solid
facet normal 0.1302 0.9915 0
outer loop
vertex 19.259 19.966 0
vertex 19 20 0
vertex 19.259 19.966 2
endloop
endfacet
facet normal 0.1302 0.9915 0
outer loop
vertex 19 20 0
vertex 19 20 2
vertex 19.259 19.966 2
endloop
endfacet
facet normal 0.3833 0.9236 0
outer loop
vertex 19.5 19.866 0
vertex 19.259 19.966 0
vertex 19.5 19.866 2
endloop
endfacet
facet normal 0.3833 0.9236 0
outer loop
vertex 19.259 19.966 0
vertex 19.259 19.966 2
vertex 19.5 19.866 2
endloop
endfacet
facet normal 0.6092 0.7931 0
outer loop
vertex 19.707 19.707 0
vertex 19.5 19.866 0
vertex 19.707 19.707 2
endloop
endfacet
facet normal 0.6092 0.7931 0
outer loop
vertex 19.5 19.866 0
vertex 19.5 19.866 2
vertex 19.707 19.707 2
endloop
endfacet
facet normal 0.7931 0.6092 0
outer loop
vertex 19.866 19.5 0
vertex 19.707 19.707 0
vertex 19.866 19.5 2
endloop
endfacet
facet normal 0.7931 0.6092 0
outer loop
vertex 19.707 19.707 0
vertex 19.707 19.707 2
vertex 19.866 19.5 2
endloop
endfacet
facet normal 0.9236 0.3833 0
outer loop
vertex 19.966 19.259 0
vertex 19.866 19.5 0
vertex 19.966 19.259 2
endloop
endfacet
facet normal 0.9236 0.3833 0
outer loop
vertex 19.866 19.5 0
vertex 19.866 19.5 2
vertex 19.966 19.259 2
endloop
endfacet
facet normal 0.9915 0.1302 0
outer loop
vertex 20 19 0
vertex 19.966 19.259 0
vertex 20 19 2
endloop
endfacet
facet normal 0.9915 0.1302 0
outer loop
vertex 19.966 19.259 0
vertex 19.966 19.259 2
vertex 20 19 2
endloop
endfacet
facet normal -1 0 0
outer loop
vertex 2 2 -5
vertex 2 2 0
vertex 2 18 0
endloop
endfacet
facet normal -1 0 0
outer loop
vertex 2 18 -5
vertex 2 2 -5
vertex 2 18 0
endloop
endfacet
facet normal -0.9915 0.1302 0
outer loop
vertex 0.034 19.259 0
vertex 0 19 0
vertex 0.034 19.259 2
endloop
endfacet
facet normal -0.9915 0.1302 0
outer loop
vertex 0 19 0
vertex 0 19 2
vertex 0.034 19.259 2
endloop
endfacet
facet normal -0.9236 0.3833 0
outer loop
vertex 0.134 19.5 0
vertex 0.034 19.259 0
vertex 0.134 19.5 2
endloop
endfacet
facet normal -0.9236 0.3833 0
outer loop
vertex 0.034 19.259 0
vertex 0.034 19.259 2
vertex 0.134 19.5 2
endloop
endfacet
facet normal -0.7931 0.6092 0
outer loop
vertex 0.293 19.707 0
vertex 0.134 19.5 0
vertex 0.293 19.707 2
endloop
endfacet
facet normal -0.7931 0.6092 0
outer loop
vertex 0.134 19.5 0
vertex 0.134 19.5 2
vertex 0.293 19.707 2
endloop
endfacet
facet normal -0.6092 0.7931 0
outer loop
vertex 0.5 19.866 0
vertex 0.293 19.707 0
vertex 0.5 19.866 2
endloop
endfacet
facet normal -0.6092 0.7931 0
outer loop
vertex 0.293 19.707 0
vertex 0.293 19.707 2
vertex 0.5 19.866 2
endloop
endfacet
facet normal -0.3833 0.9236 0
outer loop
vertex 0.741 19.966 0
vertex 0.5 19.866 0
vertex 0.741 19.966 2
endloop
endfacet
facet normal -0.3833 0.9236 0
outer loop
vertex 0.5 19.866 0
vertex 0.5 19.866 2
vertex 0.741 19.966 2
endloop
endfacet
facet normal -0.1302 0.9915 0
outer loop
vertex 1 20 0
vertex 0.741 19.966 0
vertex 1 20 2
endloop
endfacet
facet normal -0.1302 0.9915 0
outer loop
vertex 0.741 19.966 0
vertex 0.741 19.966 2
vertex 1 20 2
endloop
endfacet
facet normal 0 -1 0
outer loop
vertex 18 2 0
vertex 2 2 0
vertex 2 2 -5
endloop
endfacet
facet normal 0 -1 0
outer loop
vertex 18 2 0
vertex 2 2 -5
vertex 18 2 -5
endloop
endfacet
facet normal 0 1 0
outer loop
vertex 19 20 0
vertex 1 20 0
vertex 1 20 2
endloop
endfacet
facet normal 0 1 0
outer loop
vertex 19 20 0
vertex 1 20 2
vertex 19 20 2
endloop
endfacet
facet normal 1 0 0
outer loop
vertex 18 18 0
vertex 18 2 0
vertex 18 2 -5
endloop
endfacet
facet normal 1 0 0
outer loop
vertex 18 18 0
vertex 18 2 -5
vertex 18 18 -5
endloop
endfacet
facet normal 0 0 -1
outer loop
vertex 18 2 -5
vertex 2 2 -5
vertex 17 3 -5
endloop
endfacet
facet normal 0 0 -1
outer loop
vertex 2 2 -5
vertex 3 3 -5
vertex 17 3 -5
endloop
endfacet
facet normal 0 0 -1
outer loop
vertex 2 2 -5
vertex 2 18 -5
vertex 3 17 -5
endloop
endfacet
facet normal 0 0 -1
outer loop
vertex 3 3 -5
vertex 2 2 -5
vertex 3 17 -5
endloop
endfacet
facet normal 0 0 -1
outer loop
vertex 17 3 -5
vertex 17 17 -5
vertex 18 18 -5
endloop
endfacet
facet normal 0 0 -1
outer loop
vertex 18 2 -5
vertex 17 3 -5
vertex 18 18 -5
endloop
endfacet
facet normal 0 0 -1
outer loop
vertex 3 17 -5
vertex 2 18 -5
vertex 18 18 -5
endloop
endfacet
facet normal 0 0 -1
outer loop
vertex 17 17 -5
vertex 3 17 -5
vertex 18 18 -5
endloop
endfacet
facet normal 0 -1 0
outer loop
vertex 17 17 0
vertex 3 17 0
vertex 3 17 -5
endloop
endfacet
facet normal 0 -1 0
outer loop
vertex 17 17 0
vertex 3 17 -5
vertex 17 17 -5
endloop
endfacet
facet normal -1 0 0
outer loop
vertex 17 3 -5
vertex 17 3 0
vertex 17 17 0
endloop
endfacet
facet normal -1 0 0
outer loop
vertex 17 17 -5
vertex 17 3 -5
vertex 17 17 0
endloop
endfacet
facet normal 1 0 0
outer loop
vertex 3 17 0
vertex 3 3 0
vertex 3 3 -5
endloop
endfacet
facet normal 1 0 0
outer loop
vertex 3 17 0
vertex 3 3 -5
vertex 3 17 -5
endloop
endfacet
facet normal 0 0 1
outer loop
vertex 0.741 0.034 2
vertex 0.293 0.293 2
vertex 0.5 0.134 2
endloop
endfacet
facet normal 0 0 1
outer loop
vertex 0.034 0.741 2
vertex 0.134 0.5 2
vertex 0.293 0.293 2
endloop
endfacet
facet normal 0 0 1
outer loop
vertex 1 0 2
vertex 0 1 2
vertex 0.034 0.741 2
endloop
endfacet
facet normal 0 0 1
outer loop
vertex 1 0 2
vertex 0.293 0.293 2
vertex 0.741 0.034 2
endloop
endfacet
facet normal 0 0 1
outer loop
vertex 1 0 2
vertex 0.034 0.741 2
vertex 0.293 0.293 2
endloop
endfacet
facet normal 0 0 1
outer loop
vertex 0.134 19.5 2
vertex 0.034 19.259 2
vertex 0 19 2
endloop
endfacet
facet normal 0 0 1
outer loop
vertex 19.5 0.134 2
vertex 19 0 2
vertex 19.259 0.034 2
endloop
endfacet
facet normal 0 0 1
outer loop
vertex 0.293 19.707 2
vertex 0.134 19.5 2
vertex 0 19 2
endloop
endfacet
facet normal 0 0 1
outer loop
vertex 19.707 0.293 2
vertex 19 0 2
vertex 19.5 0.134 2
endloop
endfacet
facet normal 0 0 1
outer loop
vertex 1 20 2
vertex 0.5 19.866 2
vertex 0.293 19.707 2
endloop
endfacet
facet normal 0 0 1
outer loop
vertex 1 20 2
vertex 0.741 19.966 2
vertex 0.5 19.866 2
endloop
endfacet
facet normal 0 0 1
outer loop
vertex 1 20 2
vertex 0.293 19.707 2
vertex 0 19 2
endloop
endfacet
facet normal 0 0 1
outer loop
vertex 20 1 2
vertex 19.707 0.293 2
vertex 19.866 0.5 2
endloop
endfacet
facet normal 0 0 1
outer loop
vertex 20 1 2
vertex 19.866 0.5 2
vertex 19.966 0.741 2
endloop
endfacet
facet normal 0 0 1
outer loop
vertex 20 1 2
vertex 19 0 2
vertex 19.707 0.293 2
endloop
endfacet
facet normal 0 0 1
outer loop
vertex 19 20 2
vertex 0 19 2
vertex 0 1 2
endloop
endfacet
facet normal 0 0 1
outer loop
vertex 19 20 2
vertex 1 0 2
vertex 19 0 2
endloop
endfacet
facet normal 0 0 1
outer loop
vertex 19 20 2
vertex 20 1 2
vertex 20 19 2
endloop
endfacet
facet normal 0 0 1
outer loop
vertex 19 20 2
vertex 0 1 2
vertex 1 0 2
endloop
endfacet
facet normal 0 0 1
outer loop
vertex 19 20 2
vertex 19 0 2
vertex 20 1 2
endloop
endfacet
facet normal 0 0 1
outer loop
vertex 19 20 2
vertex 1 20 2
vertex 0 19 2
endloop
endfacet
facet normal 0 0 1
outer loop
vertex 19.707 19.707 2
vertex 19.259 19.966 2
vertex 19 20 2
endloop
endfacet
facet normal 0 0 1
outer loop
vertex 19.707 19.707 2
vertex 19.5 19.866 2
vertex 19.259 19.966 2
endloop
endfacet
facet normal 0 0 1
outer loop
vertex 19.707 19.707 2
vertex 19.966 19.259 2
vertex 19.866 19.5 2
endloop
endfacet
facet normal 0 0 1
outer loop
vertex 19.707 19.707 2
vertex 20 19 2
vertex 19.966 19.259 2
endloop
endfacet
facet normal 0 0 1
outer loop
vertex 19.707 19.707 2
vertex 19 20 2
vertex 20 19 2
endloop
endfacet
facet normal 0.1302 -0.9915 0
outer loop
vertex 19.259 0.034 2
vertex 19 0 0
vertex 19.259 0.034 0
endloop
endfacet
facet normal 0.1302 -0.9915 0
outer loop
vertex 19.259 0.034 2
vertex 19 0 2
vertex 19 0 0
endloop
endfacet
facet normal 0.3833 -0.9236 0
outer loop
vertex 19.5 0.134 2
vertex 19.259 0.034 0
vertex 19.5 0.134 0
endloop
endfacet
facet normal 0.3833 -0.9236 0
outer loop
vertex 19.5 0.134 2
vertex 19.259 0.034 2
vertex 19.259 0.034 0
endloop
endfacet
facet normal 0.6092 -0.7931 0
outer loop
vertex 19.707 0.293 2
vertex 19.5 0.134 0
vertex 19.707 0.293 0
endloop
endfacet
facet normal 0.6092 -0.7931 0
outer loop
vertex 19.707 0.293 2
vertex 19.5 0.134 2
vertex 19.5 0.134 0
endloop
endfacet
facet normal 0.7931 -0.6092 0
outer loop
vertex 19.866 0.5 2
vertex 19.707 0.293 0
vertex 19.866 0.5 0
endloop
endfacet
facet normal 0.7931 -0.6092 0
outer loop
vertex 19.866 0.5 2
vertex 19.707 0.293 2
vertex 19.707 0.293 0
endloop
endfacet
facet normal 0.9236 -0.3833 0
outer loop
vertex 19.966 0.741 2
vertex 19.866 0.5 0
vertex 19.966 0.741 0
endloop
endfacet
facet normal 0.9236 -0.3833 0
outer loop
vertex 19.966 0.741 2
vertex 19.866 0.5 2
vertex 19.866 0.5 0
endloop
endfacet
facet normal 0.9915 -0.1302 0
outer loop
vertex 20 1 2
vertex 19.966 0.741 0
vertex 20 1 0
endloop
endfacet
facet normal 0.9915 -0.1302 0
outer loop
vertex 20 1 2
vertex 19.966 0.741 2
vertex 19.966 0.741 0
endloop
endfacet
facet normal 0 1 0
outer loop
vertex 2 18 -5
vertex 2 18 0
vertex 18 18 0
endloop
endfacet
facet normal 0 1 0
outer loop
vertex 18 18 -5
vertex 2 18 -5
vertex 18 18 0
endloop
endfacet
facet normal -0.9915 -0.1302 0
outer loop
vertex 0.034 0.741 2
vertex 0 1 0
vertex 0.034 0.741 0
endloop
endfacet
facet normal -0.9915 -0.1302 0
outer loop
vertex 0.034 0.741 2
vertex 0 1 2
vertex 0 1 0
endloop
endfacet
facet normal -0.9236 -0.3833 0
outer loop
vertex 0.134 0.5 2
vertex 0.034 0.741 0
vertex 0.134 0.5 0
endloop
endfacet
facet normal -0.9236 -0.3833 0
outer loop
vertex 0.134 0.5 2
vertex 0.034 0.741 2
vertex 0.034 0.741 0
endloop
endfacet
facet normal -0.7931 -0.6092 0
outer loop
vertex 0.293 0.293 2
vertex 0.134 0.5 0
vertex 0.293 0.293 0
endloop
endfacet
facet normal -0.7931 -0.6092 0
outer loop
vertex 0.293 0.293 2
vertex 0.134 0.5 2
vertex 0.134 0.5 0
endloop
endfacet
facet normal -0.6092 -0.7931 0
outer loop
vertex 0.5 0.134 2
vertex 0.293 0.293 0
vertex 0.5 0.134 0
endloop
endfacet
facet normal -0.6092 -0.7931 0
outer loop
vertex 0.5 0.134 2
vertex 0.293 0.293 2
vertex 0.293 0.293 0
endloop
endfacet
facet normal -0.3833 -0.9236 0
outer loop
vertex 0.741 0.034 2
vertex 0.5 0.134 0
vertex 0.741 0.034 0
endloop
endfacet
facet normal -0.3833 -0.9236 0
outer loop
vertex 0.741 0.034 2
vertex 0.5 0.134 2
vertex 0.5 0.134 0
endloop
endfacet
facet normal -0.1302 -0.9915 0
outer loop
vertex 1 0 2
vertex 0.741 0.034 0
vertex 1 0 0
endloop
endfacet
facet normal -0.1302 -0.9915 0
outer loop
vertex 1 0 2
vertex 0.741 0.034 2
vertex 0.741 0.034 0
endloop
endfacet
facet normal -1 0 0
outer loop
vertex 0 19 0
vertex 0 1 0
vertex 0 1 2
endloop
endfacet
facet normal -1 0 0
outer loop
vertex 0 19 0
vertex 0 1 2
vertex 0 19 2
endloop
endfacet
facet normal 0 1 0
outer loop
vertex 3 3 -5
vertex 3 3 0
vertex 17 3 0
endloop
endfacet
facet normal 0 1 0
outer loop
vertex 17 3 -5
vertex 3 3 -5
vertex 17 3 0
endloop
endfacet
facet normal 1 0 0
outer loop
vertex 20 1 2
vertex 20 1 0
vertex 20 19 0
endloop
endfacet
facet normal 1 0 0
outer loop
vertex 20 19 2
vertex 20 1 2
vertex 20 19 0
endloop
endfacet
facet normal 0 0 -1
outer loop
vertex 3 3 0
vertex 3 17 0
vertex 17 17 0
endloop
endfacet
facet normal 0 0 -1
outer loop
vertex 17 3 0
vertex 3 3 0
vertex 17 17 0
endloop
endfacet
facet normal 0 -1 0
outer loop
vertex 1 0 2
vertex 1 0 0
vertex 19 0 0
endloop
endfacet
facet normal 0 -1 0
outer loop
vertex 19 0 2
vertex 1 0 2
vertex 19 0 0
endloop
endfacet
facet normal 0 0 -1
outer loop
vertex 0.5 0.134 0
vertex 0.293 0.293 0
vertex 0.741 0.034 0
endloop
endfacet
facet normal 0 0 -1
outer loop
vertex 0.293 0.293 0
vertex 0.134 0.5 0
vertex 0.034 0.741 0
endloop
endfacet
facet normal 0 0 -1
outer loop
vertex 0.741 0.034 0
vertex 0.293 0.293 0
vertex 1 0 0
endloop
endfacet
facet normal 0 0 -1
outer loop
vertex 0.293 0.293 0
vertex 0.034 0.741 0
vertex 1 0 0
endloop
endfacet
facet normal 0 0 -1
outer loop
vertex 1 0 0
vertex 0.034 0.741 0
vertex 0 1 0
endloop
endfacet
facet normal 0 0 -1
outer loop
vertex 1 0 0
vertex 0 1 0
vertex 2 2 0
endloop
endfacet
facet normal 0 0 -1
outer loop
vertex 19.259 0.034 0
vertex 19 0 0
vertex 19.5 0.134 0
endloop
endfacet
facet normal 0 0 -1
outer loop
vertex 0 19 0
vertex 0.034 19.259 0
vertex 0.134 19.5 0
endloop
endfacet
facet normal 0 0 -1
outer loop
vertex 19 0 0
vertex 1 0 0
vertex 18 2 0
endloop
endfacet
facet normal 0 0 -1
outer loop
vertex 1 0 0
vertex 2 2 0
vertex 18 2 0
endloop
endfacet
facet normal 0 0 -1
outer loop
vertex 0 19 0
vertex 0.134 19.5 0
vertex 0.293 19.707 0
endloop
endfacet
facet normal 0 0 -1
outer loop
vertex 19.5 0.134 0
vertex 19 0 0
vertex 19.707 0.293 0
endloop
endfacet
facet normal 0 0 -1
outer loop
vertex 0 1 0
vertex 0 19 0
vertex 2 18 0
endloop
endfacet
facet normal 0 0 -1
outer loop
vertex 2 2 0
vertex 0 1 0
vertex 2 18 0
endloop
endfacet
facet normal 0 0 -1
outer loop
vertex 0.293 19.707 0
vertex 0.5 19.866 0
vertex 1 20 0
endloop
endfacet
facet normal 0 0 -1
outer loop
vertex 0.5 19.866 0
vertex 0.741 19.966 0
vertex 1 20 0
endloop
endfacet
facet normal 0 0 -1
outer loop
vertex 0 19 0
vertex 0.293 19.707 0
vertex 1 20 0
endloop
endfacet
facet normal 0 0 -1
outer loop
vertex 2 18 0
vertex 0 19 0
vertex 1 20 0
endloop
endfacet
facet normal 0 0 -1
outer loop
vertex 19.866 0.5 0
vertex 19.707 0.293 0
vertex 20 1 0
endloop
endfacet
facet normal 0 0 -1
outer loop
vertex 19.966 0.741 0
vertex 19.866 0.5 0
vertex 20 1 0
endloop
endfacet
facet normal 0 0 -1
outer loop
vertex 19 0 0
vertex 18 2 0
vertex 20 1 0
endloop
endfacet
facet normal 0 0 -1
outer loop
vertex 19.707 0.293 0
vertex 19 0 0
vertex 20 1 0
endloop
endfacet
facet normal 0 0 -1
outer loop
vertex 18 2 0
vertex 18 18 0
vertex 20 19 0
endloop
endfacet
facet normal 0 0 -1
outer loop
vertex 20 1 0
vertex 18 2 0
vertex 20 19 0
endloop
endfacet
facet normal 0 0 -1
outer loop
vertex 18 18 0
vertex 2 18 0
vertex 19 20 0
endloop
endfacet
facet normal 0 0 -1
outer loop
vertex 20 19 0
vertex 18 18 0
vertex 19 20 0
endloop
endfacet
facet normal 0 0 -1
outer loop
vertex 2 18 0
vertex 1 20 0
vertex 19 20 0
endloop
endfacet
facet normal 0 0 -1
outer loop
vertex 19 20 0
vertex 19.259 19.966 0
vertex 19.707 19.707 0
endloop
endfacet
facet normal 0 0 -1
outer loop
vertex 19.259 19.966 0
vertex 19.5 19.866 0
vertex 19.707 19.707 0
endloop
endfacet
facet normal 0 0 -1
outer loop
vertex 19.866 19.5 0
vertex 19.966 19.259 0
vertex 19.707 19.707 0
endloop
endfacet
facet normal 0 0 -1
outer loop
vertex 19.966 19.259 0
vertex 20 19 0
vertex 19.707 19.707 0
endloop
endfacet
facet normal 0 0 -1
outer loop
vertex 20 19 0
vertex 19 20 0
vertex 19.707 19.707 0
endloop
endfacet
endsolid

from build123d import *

# Parameters (mm, degrees)
SZKIC1_W                    = 20
SZKIC1_H                    = 20
DODANIE_WYCI_GNI_CIE1_DEPTH = 2
SZKIC1_4_W                  = 16
SZKIC1_4_H                  = 16
SZKIC1_4_W_2                = 14
SZKIC1_4_H_2                = 14
DODANIE_WYCI_GNI_CIE2_DEPTH = 5
ZAOKR_GLENIE1_R             = 1


with BuildPart() as part:
    # Szkic1 → Dodanie-wyciągnięcie1 (new body)
    with BuildSketch(Plane.XY):
        with Locations((10, 10)):
            Rectangle(SZKIC1_W, SZKIC1_H)
    extrude(amount=DODANIE_WYCI_GNI_CIE1_DEPTH)

    # Szkic1<4> → Dodanie-wyciągnięcie2 (add)
    with BuildSketch(Plane.XY):
        with Locations((10, 10)):
            Rectangle(SZKIC1_4_W, SZKIC1_4_H)
        with Locations((10, 10)):
            Rectangle(SZKIC1_4_W_2, SZKIC1_4_H_2, mode=Mode.SUBTRACT)
    extrude(amount=-DODANIE_WYCI_GNI_CIE2_DEPTH)

    # Zaokrąglenie1
    zaokr_glenie1_edges = [part.edges().sort_by_distance(p)[0] for p in [
        (20, 0, 1),
        (0, 0, 1),
        (20, 20, 1),
        (0, 20, 1),
    ]]
    fillet(zaokr_glenie1_edges, radius=ZAOKR_GLENIE1_R)


solid = part.part
